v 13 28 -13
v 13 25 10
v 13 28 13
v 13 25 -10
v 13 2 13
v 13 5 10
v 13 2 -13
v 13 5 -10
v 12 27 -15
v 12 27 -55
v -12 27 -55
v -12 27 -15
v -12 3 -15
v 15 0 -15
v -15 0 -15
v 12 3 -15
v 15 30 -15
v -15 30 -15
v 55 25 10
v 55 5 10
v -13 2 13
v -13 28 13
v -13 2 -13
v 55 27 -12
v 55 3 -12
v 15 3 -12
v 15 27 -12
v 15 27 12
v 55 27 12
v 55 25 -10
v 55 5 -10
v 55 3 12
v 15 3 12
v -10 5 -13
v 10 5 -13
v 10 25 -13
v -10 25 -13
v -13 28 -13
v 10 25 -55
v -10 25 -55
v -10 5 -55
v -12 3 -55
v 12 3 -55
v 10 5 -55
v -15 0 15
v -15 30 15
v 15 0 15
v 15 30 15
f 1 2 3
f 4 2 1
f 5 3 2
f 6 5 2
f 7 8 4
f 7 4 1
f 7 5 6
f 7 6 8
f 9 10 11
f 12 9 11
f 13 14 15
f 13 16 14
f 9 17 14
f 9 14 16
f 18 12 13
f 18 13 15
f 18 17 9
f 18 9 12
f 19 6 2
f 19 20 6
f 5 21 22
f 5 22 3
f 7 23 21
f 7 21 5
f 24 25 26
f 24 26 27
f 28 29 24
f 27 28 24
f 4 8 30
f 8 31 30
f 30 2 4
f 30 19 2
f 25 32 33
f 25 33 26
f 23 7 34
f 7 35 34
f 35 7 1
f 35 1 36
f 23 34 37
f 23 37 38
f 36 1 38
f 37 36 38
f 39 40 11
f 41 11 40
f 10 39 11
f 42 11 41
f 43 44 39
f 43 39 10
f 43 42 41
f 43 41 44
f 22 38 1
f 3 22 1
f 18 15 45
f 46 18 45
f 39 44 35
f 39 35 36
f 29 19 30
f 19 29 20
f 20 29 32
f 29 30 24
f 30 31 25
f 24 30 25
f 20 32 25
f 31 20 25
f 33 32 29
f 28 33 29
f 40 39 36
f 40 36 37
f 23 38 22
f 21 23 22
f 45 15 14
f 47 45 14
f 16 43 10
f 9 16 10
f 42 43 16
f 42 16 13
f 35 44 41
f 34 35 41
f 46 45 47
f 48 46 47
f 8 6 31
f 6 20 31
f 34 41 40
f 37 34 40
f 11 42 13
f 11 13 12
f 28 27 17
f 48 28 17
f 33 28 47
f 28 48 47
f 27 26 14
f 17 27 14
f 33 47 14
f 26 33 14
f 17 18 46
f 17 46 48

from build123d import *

# Parameters (mm, degrees)
CROQUIS1_W     = 30
CROQUIS1_H     = 40
CROQUIS1_H_2   = 30
CROQUIS1_W_2   = 40
EXTRUIR1_DEPTH = 30
CROQUIS2_W     = 30
CROQUIS2_H     = 30
CROQUIS2_W_2   = 24
CROQUIS2_H_2   = 24
EXTRUIR2_DEPTH = 40
CROQUIS3_W     = 30
CROQUIS3_H     = 30
CROQUIS3_W_2   = 24
CROQUIS3_H_2   = 24
EXTRUIR3_DEPTH = 40
VACIADO1_T     = -2


with BuildPart() as part:
    # Croquis1 → Extruir1 (new body)
    with BuildSketch(Plane(origin=(0, 0, 0), x_dir=(1, 0, 0), z_dir=(0, 1, 0))):
        with Locations((0, 35)):
            Rectangle(CROQUIS1_W, CROQUIS1_H)
        Rectangle(CROQUIS1_W, CROQUIS1_H_2)
        with Locations((35, 0)):
            Rectangle(CROQUIS1_W_2, CROQUIS1_H_2)
    extrude(amount=EXTRUIR1_DEPTH)

    # Croquis2 → Extruir2 (cut)
    with BuildSketch(Plane(origin=(55, 0, 0), x_dir=(0, 0, -1), z_dir=(1, 0, 0))):
        with Locations((0, 15)):
            Rectangle(CROQUIS2_W, CROQUIS2_H)
        with Locations((0, 15)):
            Rectangle(CROQUIS2_W_2, CROQUIS2_H_2, mode=Mode.SUBTRACT)
    extrude(amount=-EXTRUIR2_DEPTH, mode=Mode.SUBTRACT)

    # Croquis3 → Extruir3 (cut)
    with BuildSketch(Plane(origin=(0, 0, -55), x_dir=(-1, 0, 0), z_dir=(0, 0, -1))):
        with Locations((0, 15)):
            Rectangle(CROQUIS3_W, CROQUIS3_H)
        with Locations((0, 15)):
            Rectangle(CROQUIS3_W_2, CROQUIS3_H_2, mode=Mode.SUBTRACT)
    extrude(amount=-EXTRUIR3_DEPTH, mode=Mode.SUBTRACT)

    # Vaciado1
    vaciado1_openings = [part.faces().sort_by_distance(p)[0] for p in [
        (55, 15, 0),
        (0, 15, -55),
    ]]
    offset(amount=VACIADO1_T, openings=vaciado1_openings, kind=Kind.INTERSECTION)


solid = part.part
